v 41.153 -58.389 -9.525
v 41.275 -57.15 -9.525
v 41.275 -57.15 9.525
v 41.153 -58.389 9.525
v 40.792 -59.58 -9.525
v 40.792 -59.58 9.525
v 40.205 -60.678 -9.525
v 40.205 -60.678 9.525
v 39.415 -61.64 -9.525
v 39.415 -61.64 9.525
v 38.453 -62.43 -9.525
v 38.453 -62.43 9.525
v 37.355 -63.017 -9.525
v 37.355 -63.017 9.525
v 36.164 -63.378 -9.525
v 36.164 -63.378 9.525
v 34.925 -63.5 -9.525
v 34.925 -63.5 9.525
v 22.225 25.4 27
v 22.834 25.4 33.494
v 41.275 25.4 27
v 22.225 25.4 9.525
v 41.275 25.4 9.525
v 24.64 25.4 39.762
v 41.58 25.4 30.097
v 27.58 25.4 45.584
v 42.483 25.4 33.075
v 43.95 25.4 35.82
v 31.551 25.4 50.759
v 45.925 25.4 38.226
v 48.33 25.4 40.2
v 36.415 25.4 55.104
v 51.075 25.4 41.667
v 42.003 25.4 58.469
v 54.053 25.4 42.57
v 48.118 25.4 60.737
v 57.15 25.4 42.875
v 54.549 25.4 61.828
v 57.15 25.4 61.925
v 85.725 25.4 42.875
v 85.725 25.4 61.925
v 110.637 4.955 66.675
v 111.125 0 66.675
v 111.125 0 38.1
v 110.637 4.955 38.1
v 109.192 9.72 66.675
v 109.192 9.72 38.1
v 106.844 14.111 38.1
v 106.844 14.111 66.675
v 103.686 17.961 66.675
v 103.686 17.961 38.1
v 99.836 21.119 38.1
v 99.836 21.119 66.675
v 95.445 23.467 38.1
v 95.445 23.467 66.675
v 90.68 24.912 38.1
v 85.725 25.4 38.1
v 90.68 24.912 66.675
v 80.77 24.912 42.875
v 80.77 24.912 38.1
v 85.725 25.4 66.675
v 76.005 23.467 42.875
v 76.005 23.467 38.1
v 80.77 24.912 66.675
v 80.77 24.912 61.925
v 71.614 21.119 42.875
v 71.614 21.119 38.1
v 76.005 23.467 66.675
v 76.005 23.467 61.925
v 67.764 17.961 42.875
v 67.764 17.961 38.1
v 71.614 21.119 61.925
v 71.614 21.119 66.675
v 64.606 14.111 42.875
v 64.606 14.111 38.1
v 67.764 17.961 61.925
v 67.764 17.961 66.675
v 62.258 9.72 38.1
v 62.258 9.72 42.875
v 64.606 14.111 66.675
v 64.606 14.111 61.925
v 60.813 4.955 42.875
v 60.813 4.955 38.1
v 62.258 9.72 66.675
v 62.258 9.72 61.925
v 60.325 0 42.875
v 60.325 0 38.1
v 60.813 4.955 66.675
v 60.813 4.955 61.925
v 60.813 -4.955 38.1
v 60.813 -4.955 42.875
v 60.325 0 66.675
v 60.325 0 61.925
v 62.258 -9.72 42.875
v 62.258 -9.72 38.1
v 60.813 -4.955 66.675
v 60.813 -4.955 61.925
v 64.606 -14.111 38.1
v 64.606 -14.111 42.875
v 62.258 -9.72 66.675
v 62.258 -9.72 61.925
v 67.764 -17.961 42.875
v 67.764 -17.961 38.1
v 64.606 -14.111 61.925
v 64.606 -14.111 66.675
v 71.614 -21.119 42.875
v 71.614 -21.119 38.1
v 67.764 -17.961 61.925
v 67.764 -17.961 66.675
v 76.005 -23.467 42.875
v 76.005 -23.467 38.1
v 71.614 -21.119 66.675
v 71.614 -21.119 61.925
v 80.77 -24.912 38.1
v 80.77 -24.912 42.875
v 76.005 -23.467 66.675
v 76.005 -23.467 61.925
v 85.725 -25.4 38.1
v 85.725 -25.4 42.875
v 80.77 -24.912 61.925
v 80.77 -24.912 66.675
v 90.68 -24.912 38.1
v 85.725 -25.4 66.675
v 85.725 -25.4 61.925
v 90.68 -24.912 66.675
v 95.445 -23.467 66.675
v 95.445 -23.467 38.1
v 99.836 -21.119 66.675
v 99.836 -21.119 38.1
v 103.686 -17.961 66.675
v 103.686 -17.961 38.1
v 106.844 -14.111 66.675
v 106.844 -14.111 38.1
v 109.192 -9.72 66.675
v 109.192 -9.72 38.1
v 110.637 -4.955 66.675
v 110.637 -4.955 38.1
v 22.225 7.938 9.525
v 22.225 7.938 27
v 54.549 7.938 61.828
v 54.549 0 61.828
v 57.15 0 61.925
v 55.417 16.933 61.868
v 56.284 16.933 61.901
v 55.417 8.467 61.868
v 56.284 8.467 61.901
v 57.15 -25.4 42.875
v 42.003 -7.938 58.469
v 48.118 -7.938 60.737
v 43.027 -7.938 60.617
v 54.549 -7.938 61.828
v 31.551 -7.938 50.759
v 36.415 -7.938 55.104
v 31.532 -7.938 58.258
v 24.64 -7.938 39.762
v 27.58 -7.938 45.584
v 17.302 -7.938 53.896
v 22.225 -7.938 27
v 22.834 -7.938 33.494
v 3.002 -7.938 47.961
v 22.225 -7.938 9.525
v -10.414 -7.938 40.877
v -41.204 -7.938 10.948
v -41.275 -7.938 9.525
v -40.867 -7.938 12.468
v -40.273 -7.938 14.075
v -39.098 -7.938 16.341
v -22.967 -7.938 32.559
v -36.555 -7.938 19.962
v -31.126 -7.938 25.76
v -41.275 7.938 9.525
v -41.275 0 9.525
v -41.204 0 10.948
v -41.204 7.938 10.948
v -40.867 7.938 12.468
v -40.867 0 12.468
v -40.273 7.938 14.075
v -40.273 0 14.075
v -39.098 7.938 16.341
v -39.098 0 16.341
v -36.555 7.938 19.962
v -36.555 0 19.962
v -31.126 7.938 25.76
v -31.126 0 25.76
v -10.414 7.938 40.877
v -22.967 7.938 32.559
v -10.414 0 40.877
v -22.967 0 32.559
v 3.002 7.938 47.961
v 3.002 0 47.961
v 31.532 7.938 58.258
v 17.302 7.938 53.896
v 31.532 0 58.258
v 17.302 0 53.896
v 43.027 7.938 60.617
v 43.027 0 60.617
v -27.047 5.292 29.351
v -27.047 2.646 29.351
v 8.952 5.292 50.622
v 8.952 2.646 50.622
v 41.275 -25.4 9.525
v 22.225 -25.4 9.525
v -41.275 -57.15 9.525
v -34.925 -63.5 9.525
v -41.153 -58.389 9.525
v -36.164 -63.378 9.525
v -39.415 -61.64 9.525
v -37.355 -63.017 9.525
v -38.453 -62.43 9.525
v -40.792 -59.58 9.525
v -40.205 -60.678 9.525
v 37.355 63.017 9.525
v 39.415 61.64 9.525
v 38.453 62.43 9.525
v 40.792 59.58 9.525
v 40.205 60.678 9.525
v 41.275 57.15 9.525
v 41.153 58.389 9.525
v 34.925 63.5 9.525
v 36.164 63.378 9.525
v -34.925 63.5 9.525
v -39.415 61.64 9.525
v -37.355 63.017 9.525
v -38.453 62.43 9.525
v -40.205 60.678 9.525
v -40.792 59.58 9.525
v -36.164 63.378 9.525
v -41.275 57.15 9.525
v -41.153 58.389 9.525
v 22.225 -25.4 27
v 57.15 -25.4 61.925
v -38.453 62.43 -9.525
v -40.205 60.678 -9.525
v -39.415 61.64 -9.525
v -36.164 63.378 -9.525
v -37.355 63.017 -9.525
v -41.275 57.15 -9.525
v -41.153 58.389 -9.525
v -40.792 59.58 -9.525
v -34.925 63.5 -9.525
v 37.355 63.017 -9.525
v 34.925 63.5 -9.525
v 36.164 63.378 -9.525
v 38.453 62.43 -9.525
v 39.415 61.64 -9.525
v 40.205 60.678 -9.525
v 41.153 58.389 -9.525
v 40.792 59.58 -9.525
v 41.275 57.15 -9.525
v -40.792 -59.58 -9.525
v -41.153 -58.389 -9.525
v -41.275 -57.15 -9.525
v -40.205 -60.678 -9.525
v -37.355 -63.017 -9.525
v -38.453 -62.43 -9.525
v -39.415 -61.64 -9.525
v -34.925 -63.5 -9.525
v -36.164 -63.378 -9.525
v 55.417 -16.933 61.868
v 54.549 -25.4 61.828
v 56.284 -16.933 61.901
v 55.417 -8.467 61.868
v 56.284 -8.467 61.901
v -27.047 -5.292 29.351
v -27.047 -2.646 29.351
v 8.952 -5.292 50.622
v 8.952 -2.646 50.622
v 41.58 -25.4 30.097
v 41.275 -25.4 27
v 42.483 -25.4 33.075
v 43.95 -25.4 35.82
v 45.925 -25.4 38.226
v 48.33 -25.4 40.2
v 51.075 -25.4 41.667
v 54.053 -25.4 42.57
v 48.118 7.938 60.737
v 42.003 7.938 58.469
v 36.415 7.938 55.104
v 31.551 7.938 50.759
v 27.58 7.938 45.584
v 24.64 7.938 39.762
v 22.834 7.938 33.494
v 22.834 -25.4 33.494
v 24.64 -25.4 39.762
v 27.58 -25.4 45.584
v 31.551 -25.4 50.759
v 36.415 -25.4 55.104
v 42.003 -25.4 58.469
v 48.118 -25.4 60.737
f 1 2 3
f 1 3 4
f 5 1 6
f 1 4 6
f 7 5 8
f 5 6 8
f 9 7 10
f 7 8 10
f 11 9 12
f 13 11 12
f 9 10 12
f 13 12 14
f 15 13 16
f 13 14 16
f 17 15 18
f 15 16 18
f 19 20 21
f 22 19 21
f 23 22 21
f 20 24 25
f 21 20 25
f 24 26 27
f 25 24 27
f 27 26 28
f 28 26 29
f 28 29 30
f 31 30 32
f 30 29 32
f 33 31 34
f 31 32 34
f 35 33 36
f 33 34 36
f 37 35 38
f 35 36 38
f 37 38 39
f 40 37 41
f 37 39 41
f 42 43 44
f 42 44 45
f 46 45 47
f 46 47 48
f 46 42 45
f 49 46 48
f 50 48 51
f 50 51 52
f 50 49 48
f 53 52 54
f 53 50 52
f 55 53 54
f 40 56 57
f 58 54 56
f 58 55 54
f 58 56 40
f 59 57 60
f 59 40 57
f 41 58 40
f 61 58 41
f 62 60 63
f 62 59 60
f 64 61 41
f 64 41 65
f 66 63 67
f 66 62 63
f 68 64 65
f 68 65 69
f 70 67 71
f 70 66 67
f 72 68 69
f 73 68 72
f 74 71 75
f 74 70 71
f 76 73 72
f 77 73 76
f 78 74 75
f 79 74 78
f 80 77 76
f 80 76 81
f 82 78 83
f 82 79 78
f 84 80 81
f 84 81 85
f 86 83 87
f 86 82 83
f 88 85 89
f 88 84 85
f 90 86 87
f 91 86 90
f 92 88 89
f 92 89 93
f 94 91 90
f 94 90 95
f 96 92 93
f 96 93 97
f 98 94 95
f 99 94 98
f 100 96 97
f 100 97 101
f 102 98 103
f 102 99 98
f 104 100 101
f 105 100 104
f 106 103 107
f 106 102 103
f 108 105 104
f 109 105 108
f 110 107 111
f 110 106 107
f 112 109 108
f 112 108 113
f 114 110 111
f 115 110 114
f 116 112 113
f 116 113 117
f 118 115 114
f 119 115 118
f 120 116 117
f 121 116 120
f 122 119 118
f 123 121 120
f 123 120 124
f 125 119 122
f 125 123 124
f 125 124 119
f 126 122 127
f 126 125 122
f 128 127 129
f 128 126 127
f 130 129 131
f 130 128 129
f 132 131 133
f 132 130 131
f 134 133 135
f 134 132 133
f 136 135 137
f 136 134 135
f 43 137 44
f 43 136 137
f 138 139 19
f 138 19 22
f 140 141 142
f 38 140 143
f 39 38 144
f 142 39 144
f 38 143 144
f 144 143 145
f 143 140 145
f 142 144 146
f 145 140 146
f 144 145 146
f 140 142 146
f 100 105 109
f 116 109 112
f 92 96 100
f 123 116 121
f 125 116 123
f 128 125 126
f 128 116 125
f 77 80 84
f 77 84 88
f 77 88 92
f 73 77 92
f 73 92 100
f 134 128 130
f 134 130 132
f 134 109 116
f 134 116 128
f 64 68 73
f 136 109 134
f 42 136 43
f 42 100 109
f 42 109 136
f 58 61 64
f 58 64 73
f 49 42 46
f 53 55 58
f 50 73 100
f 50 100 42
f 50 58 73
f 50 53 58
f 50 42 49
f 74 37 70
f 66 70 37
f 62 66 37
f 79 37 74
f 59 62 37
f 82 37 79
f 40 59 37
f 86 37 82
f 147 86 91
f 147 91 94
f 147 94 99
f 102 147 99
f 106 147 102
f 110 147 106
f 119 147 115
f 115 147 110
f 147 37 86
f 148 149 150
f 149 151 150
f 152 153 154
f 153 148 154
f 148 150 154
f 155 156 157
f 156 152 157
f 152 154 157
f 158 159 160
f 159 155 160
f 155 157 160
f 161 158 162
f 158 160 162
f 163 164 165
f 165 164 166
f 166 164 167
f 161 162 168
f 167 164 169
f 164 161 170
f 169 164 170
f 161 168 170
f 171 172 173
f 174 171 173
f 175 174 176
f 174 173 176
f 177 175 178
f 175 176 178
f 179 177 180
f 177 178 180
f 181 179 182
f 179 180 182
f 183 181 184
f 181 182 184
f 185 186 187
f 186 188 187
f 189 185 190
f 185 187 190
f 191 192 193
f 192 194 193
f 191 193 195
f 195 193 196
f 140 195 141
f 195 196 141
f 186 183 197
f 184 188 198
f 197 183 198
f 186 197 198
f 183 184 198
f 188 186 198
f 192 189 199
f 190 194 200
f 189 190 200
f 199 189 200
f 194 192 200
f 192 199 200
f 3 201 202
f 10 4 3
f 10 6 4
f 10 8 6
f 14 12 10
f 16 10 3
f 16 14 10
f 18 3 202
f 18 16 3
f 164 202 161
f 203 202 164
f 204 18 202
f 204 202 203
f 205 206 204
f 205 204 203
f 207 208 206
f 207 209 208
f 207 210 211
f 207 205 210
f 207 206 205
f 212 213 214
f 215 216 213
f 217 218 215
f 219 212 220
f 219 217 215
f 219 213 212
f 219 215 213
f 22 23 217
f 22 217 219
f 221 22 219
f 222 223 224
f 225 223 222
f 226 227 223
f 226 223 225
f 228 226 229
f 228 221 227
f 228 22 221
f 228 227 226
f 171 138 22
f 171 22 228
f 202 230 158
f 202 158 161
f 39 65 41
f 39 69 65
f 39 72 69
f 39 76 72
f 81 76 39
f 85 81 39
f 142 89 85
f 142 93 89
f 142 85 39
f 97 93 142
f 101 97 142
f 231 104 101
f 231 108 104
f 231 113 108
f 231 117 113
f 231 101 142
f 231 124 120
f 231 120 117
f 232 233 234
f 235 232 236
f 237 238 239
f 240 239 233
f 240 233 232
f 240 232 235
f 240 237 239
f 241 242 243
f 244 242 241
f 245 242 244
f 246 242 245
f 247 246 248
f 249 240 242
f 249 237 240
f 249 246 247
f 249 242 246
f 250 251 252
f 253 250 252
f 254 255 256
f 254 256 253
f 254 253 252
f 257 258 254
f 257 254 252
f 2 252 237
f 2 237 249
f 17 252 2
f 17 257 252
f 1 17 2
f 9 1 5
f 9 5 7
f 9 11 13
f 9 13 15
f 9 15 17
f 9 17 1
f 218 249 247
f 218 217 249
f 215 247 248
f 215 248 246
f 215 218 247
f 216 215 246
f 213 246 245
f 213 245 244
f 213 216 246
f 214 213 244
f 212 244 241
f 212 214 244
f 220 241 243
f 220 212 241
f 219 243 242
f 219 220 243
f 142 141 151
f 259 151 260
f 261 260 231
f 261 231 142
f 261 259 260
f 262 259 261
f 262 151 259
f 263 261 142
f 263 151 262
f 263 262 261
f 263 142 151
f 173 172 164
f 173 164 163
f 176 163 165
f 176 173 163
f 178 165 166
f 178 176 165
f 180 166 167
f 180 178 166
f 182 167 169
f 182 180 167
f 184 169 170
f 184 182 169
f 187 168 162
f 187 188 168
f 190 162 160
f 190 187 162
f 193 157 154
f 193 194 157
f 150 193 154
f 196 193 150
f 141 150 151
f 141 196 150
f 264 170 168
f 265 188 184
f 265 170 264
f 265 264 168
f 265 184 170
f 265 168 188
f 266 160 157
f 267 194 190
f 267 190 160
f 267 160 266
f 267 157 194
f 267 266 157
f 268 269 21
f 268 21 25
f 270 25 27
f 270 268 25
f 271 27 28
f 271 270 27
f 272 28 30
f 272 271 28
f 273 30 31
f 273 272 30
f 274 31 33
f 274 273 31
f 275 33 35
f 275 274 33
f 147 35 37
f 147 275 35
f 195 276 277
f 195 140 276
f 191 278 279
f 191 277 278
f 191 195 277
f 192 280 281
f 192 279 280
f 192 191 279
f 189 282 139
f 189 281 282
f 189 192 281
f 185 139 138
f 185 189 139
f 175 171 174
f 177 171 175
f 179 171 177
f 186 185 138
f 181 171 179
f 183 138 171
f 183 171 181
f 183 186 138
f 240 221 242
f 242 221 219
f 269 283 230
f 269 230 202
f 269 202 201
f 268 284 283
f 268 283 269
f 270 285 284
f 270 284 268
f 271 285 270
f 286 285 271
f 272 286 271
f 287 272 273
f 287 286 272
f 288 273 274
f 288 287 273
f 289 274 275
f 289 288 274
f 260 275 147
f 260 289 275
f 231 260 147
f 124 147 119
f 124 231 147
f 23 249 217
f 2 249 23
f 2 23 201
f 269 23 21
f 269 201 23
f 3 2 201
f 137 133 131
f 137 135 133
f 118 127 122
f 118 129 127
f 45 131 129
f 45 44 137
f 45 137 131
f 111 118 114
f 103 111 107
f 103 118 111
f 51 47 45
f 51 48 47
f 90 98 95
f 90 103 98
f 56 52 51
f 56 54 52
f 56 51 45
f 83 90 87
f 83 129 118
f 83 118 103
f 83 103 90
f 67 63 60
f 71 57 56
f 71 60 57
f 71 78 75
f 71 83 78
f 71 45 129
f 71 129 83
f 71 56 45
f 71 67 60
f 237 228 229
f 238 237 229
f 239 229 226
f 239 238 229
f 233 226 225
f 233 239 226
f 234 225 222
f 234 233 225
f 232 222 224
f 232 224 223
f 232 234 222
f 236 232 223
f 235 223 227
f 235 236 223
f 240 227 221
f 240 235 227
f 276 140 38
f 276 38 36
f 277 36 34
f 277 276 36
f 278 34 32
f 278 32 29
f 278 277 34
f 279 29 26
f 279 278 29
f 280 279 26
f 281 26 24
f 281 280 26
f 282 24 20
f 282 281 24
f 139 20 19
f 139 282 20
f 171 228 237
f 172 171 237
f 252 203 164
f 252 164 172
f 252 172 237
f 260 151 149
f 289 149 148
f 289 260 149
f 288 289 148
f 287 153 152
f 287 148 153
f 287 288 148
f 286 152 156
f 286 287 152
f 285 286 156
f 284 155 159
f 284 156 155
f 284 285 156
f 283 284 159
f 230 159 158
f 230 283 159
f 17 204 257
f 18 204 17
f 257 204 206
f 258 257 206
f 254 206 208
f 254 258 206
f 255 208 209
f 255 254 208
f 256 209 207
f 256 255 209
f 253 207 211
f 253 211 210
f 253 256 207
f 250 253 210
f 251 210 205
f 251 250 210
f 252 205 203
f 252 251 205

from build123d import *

# Parameters (mm, degrees)
F1_DEPTH = 63.5
F2_DEPTH = 25.4
F3_DEPTH = 7.9375
F4_DEPTH = 25.4
F6_R     = 6.35


with BuildPart() as f1:
    # F0 (on Front) → F1 (new body, symmetric)
    with BuildSketch(Plane.XZ):
        Polygon((-41.275, 9.525), (-41.275, -9.525), (41.275, -9.525), (41.275, 9.525), (22.225, 9.525), align=None)
    extrude(amount=F1_DEPTH, both=True)

    # F0 (on Front) → F2 (join, symmetric)
    with BuildSketch(Plane.XZ):
        with BuildLine():
            Line((22.225, 9.525), (41.275, 9.525))
            Line((41.275, 9.525), (41.275, 27.0002))
            ThreePointArc((41.275, 27.0002), (45.92468, 38.22552), (57.15, 42.8752))
            Line((57.15, 42.8752), (60.325, 42.8752))
            Line((60.325, 42.8752), (60.325, 61.9252))
            Line((60.325, 61.9252), (57.15, 61.9252))
            add(Edge.make_bspline(
                [(54.548999, 61.828212), (55.417476, 61.872022), (56.284596, 61.904465), (57.15, 61.9252)],
                knots=[109.453159, 109.453159, 109.453159, 109.453159, 111.504536, 111.504536, 111.504536, 111.504536], degree=3))
            ThreePointArc((54.548999, 61.828212), (31.551215, 50.758521), (22.225, 27.0002))
            Line((22.225, 27.0002), (22.225, 9.525))
        make_face()
    extrude(amount=F2_DEPTH, both=True)

    # F0 (on Front) → F3 (join, symmetric)
    with BuildSketch(Plane.XZ):
        with BuildLine():
            add(Edge.make_bspline(
                [(-41.275, 9.525), (-41.989152, 24.791583), (8.210591, 59.490663), (54.548999, 61.828212)],
                knots=[0, 0, 0, 0, 109.453159, 109.453159, 109.453159, 109.453159], degree=3))
            Line((-41.275, 9.525), (22.225, 9.525))
            Line((22.225, 9.525), (22.225, 27.0002))
            ThreePointArc((22.225, 27.0002), (31.551215, 50.758521), (54.548999, 61.828212))
        make_face()
    extrude(amount=F3_DEPTH, both=True)

    # F0 (on Front) → F4 (join, symmetric)
    with BuildSketch(Plane.XZ):
        Polygon((71.658204, 61.9252), (60.325, 61.9252), (60.325, 42.8752), (71.658204, 42.8752), (85.725, 42.8752), (85.725, 61.9252), align=None)
    extrude(amount=F4_DEPTH, both=True)

    # F0 (on Front) → F5 (revolve)
    with BuildSketch(Plane.XZ):
        Polygon((111.125, 66.675), (85.725, 66.675), (85.725, 61.9252), (85.725, 42.8752), (85.725, 38.1), (111.125, 38.1), align=None)
    revolve(axis=Axis((85.725, 0, 52.3875), (0, 0, 1)))

    # F6
    f6_edges = [f1.edges().sort_by_distance(p)[0] for p in [
        (41.275, -63.5, 0),
        (-41.275, -63.5, 0),
        (41.275, 63.5, 0),
        (-41.275, 63.5, 0),
    ]]
    fillet(f6_edges, radius=F6_R)


solid = f1.part
